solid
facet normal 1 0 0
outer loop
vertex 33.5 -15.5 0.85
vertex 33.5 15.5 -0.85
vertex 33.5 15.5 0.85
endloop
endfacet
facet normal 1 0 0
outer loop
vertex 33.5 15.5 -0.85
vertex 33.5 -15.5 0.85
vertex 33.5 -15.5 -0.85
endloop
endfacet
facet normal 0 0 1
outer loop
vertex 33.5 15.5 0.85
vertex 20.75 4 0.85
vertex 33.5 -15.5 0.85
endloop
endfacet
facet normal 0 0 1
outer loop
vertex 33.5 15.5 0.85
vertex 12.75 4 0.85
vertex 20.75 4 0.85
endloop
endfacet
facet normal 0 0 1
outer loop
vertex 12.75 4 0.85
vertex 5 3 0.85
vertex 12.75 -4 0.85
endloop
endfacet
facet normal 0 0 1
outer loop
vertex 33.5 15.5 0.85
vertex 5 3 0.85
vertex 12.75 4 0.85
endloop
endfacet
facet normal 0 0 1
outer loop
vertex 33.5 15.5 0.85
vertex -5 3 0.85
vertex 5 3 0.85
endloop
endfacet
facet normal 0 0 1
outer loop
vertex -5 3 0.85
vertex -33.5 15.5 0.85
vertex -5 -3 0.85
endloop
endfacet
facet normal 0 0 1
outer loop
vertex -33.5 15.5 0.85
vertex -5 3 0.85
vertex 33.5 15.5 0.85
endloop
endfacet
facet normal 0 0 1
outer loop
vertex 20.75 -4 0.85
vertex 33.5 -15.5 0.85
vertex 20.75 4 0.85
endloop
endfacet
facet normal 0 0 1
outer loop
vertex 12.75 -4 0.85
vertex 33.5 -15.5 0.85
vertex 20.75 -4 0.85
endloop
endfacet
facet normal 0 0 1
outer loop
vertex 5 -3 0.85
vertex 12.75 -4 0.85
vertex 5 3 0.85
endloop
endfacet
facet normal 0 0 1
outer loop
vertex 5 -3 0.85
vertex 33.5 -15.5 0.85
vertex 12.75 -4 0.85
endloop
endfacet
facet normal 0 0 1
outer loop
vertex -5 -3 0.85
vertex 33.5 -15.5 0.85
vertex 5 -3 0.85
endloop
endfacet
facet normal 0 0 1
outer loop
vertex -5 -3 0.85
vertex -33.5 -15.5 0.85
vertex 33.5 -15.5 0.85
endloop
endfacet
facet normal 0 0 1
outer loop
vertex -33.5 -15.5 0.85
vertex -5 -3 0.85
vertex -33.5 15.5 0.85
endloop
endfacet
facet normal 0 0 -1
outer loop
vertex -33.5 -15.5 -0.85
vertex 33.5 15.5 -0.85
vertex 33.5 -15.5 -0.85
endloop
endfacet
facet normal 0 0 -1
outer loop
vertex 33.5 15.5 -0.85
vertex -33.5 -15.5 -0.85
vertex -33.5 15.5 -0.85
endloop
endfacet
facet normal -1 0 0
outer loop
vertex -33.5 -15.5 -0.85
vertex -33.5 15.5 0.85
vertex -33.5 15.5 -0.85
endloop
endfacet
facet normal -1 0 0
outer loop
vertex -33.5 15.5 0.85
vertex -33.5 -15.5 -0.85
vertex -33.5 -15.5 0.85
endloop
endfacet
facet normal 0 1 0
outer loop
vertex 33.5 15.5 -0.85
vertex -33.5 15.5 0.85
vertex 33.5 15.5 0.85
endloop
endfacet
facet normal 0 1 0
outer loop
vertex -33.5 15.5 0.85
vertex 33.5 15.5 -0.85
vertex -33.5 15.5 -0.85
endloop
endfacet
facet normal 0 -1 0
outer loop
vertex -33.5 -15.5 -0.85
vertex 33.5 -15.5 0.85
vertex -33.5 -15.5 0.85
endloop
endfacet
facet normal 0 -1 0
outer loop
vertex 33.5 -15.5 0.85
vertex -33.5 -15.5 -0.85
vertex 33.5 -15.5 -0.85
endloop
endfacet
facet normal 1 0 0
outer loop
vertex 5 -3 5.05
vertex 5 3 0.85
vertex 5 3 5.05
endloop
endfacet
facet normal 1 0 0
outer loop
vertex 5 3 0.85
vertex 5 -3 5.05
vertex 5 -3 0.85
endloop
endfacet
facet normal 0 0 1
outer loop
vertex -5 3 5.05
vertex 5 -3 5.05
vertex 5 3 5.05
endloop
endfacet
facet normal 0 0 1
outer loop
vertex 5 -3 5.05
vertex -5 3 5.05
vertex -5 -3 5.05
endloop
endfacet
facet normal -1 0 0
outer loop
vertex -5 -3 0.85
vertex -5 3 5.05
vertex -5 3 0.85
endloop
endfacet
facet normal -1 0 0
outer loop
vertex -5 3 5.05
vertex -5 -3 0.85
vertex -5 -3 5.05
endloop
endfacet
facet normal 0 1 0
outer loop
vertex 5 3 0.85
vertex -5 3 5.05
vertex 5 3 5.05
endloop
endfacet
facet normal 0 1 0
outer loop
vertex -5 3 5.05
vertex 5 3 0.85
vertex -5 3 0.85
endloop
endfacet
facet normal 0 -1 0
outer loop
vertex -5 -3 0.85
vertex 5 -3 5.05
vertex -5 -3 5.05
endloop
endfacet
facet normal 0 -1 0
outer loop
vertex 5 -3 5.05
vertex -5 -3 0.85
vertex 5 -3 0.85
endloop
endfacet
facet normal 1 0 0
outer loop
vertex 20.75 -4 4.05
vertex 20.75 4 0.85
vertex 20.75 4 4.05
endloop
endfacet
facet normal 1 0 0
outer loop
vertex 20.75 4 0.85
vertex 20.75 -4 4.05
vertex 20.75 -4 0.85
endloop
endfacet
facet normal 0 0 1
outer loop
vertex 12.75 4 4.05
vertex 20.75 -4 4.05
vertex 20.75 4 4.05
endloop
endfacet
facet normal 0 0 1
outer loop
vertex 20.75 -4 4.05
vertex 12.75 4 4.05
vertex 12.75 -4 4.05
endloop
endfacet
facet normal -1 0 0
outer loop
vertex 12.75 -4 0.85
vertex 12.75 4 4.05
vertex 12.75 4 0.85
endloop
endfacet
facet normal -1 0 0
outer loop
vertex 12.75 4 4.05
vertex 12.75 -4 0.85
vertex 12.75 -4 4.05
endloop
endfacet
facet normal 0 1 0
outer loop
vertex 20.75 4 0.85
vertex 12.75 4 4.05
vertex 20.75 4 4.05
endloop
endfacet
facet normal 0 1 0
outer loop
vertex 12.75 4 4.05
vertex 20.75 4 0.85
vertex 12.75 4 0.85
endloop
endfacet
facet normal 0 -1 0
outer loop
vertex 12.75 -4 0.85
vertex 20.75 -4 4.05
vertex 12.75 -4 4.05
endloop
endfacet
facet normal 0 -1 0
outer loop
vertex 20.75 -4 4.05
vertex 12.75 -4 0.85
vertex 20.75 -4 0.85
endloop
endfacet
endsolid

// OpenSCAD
// Parameters
pcb_length = 67; //[33.5:134:0.5]
pcb_width = 31; //[15.5:62:0.5]
pcb_thickness = 1.7; //[0.8:3.4:0.1]
silkscreen_thickness = 0.05; //[0.02:0.2:0.01]
copper_thickness = 0.035; //[0.017:0.105:0.001]
layer_inset = 0.5; //[0.2:2:0.1]
overlap = 0.8; //[0.5:2:0.1]
mounting_hole_diameter = 3.2; //[2:6:0.1]
mounting_hole_edge_offset = 3.5; //[2:10:0.1]
connector_placeholder_size_x = 10; //[5:25:0.5]
connector_placeholder_size_y = 6; //[3:20:0.5]
connector_placeholder_size_z = 5; //[2:20:0.5]
component_placeholder_size_x = 8; //[3:30:0.5]
component_placeholder_size_y = 8; //[3:30:0.5]
component_placeholder_size_z = 4; //[1:20:0.5]
edge_chamfer_size = 0.8; //[0:3:0.1]

// Geometry
module pcb_main_body() {
  color([0.0, 0.4, 0.2]) // Green for PCB
  cube([pcb_length, pcb_width, pcb_thickness], center=true);
}

module silkscreen_markings() {
  color("White") // White for silkscreen
  translate([0, 0, pcb_thickness/2 + silkscreen_thickness/2 - overlap])
    cube([pcb_length - 2*layer_inset, pcb_width - 2*layer_inset, silkscreen_thickness], center=true);
}

module copper_pours() {
  color([0.72, 0.45, 0.2]) // Copper color
  translate([0, 0, -pcb_thickness/2 - copper_thickness/2 + overlap])
    cube([pcb_length - 2*layer_inset, pcb_width - 2*layer_inset, copper_thickness], center=true);
}

module connectors() {
  color([0.85, 0.85, 0.8]) // Off-white for connectors
  translate([0, 0, pcb_thickness/2 + connector_placeholder_size_z/2 - overlap])
    cube([connector_placeholder_size_x, connector_placeholder_size_y, connector_placeholder_size_z], center=true);
}

module components() {
  color([0.1, 0.1, 0.6]) // Blue for components
  translate([pcb_length/4, 0, pcb_thickness/2 + component_placeholder_size_z/2 - overlap])
    cube([component_placeholder_size_x, component_placeholder_size_y, component_placeholder_size_z], center=true);
}

// Final PCB assembly
module pcb_complete_union() {
  union() {
    pcb_main_body();
    silkscreen_markings();
    copper_pours();
    connectors();
    components();
  }
}

// Render the final PCB
pcb_complete_union();
